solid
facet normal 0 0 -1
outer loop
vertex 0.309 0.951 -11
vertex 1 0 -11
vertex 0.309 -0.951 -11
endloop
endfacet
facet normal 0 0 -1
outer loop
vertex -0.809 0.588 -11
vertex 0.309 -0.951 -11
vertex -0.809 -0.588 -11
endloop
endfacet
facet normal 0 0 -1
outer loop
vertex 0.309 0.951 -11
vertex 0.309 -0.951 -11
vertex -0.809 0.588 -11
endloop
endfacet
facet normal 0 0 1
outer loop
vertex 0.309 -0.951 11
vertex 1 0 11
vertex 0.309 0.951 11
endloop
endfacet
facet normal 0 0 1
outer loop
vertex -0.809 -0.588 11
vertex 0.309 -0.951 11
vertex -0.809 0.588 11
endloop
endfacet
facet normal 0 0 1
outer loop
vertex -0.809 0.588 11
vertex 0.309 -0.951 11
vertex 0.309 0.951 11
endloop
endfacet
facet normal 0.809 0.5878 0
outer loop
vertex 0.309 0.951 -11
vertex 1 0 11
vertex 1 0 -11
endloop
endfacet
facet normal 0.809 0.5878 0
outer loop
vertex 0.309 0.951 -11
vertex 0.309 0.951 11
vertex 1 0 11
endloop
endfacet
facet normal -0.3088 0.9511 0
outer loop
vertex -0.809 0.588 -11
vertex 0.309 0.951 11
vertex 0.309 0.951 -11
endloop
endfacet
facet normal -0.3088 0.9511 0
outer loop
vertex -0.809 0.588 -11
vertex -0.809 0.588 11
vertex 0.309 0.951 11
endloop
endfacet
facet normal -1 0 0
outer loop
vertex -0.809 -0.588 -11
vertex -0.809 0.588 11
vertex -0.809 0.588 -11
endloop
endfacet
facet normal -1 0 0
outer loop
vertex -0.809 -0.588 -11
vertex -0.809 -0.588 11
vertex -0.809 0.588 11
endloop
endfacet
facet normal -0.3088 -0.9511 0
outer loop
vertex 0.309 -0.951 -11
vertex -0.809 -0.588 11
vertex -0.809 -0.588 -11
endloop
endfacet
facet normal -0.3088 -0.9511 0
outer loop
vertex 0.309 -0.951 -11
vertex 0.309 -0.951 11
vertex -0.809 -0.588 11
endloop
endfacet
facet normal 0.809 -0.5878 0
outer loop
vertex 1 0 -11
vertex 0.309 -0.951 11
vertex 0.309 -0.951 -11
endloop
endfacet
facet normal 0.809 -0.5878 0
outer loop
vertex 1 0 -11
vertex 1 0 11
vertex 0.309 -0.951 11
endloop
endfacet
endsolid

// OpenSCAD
// Unit of length: Unit.MM
linear_extrude(height = 22.0, center = true, twist = 0.0, scale = 1.0)
{
   circle(d = 2.0);
}
